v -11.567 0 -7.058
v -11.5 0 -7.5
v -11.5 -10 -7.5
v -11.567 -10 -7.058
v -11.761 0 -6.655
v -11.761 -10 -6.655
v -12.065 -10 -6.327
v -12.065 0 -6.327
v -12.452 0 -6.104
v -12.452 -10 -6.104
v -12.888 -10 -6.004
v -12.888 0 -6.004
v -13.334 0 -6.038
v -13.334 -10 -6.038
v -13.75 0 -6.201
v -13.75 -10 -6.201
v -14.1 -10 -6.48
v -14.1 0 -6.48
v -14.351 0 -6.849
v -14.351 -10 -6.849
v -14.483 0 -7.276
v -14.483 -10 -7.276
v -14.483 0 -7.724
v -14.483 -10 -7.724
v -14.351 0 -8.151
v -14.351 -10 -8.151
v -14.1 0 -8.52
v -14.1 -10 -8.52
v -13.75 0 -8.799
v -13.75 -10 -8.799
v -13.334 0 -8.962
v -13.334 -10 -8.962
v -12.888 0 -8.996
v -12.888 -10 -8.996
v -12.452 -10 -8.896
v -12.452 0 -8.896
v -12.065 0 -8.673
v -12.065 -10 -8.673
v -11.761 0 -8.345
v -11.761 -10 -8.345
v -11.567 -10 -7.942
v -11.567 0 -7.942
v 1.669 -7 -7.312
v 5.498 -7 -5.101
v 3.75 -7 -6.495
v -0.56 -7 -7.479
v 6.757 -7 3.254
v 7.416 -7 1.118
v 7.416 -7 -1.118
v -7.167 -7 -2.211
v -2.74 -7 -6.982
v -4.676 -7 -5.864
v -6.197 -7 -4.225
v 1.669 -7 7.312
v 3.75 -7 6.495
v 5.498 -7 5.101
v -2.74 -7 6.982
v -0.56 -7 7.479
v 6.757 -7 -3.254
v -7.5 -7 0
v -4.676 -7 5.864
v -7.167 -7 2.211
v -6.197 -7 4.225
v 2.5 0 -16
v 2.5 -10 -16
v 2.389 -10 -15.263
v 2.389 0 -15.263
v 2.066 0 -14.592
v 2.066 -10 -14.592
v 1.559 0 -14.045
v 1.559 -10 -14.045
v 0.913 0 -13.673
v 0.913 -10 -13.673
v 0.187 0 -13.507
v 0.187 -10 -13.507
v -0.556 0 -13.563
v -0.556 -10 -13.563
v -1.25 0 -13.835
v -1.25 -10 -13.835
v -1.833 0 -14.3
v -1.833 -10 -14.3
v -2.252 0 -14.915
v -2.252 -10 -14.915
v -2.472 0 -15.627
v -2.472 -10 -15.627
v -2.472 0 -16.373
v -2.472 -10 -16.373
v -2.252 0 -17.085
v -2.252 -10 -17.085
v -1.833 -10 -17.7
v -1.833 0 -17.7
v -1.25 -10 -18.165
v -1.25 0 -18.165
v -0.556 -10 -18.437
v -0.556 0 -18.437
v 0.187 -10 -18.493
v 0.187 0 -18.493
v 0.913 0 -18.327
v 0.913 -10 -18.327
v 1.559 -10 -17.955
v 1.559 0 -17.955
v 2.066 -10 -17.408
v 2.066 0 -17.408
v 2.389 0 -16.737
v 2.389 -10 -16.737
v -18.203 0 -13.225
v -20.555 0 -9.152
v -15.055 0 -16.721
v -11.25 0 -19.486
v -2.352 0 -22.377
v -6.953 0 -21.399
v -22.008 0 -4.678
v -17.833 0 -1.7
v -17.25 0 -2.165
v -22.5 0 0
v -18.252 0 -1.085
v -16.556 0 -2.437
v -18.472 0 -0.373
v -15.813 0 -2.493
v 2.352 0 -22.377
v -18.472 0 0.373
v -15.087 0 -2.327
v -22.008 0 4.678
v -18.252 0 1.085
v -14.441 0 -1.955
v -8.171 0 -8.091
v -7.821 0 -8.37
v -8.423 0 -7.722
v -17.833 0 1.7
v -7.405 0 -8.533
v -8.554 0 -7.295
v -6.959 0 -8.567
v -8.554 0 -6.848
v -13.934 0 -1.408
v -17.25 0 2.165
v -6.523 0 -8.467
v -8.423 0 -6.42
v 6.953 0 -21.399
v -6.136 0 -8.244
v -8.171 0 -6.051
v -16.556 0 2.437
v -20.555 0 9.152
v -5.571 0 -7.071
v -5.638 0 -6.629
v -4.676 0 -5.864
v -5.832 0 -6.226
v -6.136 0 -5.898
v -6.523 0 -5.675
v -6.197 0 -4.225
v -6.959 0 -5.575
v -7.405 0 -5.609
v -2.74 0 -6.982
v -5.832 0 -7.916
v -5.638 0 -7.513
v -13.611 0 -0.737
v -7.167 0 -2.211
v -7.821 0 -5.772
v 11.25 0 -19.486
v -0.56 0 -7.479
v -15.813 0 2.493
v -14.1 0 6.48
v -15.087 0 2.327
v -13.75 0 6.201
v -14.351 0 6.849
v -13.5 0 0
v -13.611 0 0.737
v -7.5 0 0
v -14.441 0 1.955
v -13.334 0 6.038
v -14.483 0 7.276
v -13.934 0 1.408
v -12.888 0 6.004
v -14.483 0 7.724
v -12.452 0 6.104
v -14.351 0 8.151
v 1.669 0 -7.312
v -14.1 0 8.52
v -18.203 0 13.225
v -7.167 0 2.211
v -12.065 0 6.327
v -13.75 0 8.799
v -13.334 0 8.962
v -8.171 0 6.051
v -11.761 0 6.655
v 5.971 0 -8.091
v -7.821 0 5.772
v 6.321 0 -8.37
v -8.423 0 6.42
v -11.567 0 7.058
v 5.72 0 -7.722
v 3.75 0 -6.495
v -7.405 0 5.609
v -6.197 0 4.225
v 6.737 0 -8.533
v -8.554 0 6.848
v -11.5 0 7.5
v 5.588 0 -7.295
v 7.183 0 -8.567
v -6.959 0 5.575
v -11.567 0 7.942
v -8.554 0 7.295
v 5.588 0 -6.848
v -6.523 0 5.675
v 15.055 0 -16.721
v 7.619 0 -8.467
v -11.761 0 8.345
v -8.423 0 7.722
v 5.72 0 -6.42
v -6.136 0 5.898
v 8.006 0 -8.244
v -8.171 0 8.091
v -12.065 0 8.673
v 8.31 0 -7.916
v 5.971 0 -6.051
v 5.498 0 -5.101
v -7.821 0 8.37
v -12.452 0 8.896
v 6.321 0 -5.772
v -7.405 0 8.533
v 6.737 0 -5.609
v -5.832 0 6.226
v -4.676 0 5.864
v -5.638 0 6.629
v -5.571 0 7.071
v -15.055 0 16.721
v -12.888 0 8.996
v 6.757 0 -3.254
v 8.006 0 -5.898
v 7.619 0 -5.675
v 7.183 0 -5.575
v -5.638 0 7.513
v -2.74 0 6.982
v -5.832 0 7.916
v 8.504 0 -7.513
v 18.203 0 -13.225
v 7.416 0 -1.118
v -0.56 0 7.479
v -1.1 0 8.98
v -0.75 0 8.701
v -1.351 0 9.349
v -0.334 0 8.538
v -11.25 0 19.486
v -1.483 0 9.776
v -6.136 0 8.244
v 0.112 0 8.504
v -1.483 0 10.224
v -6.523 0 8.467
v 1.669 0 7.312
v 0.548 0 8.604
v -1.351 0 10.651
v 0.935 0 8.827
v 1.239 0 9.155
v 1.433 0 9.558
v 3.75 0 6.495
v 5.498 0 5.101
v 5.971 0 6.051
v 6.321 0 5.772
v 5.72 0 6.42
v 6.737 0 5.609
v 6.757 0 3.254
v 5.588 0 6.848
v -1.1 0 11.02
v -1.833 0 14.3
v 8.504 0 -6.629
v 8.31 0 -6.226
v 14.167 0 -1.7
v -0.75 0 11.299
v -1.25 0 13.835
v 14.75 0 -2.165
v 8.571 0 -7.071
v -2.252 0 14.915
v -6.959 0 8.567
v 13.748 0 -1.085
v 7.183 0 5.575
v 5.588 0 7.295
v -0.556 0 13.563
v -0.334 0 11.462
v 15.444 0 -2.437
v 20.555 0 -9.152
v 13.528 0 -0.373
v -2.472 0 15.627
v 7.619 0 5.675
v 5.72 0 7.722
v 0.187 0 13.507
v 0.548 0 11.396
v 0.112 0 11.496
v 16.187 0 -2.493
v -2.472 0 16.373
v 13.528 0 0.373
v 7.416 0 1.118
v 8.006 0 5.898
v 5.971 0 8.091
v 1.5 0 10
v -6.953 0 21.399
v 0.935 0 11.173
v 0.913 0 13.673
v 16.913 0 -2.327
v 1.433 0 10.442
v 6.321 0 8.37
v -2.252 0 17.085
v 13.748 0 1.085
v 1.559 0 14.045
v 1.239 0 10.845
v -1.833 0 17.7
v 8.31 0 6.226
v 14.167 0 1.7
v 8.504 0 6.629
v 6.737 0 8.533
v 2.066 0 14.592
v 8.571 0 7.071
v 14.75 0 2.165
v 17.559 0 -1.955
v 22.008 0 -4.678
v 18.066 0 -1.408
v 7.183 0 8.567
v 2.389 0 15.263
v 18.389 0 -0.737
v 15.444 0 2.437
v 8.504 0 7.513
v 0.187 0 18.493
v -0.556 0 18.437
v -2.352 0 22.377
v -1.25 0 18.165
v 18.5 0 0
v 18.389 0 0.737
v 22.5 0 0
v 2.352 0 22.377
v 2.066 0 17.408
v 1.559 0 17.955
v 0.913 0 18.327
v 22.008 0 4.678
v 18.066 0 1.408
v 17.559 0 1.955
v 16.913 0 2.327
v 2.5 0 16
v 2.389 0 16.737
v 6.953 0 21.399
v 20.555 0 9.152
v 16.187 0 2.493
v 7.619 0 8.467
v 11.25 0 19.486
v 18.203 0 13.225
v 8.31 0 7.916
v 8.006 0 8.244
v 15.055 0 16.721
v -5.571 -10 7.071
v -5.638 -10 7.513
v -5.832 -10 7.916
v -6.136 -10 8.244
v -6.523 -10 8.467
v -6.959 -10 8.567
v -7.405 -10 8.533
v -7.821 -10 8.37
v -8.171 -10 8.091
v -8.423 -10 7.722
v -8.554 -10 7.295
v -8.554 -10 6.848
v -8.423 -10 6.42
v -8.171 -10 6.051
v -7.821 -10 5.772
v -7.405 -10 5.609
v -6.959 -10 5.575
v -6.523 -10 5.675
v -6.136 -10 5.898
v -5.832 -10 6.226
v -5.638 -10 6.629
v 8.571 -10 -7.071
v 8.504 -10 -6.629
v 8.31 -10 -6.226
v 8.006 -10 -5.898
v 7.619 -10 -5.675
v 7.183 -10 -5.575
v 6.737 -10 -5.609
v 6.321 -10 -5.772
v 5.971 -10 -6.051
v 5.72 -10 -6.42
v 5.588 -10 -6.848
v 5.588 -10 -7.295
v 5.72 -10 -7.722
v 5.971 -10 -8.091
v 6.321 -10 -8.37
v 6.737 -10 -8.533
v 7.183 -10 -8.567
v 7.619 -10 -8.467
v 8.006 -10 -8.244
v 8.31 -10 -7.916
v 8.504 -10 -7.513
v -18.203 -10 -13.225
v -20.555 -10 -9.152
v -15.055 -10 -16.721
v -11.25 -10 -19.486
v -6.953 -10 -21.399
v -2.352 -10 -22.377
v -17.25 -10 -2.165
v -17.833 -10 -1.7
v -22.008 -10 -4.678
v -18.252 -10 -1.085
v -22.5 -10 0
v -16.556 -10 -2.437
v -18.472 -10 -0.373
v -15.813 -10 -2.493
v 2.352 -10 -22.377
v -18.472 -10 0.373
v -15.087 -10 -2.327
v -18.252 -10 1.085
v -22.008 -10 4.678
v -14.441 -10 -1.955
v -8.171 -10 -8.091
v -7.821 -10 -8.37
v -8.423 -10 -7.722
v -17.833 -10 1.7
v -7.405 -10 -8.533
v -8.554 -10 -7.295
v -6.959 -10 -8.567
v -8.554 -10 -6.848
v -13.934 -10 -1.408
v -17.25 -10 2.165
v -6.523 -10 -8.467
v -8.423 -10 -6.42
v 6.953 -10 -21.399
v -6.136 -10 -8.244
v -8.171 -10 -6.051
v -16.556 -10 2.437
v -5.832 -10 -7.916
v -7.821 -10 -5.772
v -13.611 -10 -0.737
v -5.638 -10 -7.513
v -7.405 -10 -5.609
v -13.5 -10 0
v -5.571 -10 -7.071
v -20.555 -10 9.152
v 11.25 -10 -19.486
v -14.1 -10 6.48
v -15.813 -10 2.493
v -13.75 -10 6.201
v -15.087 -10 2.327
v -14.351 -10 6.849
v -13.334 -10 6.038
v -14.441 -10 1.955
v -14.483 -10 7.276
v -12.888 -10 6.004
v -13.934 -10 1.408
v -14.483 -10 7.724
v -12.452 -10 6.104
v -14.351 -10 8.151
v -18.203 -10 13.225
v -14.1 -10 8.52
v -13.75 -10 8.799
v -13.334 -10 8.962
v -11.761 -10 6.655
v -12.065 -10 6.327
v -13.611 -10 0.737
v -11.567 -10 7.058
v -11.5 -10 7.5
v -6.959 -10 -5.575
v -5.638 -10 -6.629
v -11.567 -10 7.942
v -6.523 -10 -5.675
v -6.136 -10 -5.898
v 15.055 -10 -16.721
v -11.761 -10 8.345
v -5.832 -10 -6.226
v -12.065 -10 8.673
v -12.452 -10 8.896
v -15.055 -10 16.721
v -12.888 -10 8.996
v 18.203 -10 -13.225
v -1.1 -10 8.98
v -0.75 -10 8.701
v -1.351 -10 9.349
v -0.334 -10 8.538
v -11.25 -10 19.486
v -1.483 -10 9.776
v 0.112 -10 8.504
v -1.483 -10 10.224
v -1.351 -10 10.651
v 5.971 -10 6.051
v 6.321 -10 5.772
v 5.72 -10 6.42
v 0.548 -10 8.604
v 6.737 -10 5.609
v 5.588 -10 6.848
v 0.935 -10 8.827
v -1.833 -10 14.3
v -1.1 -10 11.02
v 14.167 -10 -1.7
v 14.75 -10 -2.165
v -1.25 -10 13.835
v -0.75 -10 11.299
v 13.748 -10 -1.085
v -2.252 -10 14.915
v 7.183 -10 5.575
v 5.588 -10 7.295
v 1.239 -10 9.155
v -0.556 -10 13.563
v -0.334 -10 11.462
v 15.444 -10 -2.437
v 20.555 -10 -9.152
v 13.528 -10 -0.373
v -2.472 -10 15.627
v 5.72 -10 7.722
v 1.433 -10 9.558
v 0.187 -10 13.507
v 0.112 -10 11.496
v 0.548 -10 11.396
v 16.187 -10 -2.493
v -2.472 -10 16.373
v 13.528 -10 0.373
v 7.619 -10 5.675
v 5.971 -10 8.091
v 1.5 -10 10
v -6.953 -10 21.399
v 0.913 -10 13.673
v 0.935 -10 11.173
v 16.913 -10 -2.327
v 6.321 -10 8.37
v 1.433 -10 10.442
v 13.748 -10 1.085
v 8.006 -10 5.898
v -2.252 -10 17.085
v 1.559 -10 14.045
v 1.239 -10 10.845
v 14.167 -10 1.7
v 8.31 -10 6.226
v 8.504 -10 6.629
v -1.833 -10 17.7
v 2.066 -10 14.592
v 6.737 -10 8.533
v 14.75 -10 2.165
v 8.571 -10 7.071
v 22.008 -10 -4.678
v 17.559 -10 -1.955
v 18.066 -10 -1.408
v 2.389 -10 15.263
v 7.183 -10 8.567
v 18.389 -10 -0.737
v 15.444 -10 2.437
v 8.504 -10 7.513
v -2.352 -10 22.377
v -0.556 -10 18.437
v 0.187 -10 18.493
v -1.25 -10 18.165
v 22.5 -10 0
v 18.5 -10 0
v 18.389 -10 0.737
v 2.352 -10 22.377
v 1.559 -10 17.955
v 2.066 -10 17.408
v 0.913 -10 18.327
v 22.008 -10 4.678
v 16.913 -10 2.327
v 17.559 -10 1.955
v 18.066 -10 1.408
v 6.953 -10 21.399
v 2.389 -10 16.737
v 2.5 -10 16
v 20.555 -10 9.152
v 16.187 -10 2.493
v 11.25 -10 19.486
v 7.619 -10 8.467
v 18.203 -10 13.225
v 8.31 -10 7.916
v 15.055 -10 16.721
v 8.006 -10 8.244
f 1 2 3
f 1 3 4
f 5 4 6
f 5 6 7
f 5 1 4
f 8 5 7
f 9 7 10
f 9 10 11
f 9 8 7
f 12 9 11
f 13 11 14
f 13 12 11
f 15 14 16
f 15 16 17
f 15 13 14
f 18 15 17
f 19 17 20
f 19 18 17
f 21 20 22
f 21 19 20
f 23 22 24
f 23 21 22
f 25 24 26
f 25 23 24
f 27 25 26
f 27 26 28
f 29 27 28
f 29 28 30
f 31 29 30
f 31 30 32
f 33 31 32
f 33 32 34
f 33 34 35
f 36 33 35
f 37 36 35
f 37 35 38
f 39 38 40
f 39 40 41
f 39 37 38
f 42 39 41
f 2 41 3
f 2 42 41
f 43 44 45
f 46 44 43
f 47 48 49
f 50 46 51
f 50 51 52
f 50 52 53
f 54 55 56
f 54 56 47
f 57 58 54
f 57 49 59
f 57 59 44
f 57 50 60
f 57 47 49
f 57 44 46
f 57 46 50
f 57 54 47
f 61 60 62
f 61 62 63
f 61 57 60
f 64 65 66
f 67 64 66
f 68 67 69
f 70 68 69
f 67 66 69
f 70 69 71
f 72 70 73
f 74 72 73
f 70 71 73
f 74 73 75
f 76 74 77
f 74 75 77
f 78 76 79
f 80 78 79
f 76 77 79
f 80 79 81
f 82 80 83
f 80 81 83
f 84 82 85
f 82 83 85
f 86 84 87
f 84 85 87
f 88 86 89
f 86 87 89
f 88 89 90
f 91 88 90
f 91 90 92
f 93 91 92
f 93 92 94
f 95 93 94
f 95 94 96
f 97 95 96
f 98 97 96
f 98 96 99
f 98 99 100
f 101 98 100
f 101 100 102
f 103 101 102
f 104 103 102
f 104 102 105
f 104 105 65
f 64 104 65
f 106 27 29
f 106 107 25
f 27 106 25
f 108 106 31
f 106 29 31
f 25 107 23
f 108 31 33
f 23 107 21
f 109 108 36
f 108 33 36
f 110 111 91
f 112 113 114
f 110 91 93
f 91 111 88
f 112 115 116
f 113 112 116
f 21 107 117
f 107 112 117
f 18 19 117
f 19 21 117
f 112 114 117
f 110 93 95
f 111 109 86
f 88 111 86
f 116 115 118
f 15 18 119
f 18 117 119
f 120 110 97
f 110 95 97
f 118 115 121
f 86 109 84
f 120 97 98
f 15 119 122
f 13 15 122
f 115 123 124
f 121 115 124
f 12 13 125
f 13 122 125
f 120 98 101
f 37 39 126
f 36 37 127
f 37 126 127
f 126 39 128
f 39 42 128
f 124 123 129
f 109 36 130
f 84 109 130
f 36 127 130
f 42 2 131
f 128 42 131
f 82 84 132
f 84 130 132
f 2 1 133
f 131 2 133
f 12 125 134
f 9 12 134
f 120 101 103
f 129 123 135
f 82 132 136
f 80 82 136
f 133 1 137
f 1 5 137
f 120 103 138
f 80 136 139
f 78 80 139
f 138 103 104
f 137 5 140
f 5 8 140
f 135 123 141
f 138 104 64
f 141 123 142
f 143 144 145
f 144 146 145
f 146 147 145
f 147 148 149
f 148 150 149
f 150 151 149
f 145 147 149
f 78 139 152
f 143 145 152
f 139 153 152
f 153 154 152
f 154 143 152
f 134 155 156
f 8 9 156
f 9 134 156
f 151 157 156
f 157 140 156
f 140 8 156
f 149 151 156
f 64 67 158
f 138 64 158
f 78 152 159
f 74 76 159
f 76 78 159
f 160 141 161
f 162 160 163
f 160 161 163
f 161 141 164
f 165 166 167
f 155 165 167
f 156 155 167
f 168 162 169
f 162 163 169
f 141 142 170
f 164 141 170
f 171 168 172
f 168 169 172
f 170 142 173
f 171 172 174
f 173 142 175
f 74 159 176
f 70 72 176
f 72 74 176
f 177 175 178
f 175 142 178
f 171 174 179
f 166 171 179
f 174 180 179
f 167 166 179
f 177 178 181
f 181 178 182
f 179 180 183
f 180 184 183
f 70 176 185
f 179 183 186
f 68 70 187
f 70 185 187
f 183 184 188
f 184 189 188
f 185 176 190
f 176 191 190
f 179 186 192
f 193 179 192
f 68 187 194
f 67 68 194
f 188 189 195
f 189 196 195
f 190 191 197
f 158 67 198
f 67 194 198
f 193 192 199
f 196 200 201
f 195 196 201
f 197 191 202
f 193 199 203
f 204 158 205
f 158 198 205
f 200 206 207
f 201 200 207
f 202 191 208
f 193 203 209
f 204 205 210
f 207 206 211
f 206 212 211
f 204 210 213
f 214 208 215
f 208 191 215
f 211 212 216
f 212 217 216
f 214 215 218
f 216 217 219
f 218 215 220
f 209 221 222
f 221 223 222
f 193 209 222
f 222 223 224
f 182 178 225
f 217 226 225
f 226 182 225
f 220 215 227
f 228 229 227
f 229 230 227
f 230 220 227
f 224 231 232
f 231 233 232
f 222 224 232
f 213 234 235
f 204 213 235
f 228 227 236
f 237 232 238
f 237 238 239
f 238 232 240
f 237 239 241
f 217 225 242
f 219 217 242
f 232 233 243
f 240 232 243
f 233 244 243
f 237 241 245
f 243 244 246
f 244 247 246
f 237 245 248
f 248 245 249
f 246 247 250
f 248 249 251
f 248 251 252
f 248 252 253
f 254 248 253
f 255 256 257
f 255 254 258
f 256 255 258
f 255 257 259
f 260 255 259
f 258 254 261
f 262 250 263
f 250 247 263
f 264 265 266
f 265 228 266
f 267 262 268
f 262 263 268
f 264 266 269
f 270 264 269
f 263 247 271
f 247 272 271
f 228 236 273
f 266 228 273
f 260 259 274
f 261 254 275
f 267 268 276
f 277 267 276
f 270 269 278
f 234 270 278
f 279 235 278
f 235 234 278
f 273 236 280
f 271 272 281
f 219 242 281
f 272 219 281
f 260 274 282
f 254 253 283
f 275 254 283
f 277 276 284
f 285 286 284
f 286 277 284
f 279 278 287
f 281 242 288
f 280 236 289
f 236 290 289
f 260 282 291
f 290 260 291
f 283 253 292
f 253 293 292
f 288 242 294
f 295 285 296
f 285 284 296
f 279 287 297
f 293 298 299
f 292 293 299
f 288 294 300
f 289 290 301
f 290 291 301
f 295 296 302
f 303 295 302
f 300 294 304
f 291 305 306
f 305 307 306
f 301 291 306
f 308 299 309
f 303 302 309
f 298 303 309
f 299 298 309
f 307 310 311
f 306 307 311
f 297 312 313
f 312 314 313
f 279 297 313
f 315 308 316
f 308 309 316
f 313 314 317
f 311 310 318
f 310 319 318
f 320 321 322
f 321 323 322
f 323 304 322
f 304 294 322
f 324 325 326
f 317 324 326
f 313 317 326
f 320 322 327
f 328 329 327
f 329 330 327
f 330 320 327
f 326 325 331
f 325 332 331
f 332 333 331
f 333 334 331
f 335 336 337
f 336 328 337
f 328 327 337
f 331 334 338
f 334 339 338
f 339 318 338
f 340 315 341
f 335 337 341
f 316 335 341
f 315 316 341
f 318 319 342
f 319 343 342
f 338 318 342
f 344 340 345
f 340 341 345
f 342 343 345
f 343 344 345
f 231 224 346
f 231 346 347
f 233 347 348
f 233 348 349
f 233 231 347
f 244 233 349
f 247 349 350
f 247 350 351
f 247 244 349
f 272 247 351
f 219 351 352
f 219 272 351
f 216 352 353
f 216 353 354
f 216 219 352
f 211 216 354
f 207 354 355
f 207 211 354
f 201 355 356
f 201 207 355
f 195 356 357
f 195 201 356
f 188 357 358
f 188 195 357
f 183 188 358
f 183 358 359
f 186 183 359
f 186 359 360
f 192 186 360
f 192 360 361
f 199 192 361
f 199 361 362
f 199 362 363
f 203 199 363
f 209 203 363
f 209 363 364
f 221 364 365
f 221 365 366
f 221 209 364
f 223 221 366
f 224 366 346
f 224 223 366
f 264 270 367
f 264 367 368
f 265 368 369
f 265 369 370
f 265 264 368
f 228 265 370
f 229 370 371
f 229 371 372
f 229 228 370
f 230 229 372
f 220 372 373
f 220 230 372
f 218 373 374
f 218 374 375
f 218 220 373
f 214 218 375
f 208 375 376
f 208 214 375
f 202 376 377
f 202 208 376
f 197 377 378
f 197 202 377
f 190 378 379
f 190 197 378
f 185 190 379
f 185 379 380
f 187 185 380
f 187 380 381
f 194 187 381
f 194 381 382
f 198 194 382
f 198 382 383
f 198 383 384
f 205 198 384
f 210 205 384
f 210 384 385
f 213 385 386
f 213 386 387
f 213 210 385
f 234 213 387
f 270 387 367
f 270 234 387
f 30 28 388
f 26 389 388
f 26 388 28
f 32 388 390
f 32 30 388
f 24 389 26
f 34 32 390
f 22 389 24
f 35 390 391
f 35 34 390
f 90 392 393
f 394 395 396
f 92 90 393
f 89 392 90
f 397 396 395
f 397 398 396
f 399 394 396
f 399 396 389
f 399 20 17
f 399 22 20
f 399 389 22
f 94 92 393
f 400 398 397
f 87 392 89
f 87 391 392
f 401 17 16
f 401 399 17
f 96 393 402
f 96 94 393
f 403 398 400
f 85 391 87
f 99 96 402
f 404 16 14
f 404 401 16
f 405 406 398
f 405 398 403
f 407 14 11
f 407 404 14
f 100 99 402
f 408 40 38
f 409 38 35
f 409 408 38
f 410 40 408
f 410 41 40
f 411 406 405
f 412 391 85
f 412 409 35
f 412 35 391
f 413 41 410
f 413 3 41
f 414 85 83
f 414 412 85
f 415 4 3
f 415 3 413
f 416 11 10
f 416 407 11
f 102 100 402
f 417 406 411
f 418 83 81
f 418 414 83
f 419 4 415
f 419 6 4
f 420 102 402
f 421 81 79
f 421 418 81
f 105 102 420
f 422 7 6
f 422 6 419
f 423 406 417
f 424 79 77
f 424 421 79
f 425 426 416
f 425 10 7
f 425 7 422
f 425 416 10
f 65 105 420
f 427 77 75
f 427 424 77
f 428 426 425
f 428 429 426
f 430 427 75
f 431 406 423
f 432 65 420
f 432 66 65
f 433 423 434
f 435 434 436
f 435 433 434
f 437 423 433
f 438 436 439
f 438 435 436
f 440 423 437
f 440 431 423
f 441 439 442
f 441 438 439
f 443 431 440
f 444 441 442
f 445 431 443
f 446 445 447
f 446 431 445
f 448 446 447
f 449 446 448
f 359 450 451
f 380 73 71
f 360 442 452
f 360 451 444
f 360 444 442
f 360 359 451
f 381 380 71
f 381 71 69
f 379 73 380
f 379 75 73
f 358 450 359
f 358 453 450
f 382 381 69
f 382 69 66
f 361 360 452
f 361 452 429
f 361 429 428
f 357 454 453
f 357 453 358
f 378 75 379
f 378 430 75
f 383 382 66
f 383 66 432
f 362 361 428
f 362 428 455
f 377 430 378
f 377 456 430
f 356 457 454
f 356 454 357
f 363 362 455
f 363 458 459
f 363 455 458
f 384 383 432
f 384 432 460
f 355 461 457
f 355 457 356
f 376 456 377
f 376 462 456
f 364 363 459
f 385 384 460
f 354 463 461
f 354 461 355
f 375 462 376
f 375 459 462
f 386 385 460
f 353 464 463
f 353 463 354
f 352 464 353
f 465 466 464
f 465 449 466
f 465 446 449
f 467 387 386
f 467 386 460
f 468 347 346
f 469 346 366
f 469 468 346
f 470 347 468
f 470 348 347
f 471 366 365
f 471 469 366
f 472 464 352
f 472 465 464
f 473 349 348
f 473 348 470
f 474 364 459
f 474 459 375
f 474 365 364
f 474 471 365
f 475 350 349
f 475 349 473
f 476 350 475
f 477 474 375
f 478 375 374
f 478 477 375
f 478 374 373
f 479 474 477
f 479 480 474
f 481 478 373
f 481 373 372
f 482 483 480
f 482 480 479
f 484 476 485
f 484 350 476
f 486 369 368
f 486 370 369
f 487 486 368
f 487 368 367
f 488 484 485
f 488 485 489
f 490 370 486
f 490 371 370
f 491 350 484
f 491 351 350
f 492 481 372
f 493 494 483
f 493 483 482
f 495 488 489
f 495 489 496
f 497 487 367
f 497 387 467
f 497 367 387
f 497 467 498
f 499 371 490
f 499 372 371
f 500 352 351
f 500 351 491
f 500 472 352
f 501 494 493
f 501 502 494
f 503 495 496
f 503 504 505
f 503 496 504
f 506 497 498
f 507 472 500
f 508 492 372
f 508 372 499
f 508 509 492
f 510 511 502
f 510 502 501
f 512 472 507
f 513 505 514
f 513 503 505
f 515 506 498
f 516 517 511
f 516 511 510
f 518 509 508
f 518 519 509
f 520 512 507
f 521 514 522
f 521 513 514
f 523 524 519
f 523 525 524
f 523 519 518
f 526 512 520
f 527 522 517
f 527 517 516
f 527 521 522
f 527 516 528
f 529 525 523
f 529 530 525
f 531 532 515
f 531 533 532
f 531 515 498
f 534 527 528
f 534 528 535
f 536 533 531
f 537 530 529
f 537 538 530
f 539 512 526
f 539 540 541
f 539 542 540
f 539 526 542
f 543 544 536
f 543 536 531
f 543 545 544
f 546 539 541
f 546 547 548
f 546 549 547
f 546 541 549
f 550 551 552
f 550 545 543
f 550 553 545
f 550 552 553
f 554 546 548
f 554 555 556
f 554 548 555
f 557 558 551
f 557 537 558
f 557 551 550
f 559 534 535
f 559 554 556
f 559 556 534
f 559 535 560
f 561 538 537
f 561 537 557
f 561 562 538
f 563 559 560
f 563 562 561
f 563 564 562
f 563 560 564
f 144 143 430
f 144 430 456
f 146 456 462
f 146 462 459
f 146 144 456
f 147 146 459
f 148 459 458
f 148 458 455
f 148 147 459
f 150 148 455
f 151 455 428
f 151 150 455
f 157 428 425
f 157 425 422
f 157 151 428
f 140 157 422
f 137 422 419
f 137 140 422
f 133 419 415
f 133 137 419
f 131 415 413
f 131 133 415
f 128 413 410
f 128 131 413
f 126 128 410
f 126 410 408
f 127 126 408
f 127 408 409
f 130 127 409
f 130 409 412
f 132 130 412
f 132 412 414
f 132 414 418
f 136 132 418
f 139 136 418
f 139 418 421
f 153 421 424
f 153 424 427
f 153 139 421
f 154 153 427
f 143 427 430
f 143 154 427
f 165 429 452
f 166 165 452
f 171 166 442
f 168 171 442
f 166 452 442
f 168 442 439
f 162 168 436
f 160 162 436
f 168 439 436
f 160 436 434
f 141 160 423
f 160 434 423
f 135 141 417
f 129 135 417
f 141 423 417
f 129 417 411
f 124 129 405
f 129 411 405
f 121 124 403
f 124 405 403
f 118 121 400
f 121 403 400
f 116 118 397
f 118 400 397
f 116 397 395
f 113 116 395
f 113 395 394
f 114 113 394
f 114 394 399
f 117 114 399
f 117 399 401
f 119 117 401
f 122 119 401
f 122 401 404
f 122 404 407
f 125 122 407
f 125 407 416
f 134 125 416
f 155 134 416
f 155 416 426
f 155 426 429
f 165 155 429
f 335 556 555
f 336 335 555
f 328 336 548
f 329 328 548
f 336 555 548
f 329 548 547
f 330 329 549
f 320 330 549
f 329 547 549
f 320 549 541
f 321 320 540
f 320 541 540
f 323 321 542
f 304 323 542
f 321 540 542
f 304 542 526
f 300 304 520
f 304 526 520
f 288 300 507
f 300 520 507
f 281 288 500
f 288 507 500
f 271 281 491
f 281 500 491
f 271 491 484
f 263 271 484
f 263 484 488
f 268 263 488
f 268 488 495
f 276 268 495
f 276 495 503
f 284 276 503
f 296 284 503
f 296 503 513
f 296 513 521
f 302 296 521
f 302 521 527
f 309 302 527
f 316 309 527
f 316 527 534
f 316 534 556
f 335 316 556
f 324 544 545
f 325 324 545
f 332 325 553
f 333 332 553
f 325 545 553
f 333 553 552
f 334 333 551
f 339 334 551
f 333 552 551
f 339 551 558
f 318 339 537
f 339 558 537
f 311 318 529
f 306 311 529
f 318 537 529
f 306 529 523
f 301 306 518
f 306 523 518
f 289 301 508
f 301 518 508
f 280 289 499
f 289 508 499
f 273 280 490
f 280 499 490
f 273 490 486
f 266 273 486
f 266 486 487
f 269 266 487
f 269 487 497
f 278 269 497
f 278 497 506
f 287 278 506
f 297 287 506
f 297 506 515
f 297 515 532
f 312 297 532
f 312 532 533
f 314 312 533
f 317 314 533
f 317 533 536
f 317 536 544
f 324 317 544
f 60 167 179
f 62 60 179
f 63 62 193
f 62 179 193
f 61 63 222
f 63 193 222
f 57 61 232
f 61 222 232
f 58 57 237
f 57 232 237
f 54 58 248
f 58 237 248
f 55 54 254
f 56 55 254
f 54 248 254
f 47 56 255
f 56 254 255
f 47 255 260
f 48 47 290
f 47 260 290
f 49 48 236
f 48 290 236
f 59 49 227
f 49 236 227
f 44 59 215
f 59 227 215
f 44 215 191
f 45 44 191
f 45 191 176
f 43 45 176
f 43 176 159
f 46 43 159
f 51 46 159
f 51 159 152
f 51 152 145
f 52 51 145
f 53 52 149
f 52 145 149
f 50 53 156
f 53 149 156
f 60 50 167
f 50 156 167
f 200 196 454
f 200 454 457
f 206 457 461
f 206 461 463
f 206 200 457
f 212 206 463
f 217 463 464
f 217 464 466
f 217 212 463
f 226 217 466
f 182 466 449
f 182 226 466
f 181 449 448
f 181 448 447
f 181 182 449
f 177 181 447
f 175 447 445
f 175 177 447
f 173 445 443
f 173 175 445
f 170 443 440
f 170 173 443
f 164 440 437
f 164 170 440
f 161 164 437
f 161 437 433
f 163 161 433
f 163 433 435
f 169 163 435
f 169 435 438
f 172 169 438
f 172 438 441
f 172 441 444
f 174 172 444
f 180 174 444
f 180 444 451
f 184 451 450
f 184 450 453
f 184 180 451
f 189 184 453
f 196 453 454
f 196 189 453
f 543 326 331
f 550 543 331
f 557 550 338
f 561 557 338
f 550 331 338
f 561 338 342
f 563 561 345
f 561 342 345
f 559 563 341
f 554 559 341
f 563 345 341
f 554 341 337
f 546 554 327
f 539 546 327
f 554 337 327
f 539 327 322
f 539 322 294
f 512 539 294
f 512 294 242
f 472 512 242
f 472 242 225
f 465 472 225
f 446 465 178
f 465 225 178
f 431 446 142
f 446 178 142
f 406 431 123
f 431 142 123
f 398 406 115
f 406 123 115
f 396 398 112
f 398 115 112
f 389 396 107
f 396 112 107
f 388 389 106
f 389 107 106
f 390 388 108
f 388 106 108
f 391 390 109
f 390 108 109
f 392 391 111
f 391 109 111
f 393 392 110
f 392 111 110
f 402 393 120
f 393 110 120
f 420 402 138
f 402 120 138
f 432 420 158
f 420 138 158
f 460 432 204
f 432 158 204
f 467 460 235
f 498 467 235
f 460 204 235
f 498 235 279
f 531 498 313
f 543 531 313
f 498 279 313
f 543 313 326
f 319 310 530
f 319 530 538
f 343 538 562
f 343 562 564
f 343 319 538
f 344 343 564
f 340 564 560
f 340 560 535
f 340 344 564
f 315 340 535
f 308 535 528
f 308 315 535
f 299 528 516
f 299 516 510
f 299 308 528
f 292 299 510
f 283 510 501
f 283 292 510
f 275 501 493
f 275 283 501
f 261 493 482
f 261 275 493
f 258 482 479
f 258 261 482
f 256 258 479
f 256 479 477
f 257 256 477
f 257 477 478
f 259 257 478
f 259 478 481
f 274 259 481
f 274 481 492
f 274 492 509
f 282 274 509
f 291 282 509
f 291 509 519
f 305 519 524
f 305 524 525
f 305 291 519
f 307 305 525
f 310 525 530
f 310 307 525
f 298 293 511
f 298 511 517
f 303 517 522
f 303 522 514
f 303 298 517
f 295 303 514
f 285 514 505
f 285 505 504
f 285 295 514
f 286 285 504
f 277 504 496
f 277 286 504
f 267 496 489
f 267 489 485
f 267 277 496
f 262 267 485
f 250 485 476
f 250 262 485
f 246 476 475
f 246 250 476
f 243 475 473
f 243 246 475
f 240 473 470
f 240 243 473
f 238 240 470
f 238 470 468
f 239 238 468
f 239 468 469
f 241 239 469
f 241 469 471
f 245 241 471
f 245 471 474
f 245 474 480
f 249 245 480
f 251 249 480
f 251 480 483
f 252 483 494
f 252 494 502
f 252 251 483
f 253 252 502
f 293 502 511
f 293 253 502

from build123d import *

# Parameters (mm, degrees)
F0_R     = 22.5
F0_R_2   = 1.5
F1_DEPTH = 10
F2_R     = 7.5
F3_DEPTH = 7
F4_R     = 2.5
F5_DEPTH = 25


with BuildPart() as f1:
    # F0 (on Front) → F1 (new body)
    with BuildSketch(Plane.XZ):
        Circle(F0_R)
        with Locations((-13, -7.5)):
            Circle(F0_R_2, mode=Mode.SUBTRACT)
        with Locations((-7.071068, -7.071068)):
            Circle(F0_R_2, mode=Mode.SUBTRACT)
        with Locations((7.071068, -7.071068)):
            Circle(F0_R_2, mode=Mode.SUBTRACT)
        with Locations((-13, 7.5)):
            Circle(F0_R_2, mode=Mode.SUBTRACT)
        with Locations((-7.071068, 7.071068)):
            Circle(F0_R_2, mode=Mode.SUBTRACT)
        with Locations((0, 10)):
            Circle(F0_R_2, mode=Mode.SUBTRACT)
        with Locations((7.071068, 7.071068)):
            Circle(F0_R_2, mode=Mode.SUBTRACT)
    extrude(amount=F1_DEPTH)

    # F2 (on face) → F3 (cut)
    with BuildSketch(Plane(origin=(0, 0, 0), x_dir=(-1, 0, 0), z_dir=(0, 1, 0))):
        Circle(F2_R)
    extrude(amount=-F3_DEPTH, mode=Mode.SUBTRACT)

    # F4 (on face) → F5 (cut)
    with BuildSketch(Plane.XZ.offset(10)):
        with Locations((0, 16)):
            Circle(F4_R)
        with Locations((16, 0)):
            Circle(F4_R)
        with Locations((0, -16)):
            Circle(F4_R)
        with Locations((-16, 0)):
            Circle(F4_R)
    extrude(amount=-F5_DEPTH, mode=Mode.SUBTRACT)


solid = f1.part
